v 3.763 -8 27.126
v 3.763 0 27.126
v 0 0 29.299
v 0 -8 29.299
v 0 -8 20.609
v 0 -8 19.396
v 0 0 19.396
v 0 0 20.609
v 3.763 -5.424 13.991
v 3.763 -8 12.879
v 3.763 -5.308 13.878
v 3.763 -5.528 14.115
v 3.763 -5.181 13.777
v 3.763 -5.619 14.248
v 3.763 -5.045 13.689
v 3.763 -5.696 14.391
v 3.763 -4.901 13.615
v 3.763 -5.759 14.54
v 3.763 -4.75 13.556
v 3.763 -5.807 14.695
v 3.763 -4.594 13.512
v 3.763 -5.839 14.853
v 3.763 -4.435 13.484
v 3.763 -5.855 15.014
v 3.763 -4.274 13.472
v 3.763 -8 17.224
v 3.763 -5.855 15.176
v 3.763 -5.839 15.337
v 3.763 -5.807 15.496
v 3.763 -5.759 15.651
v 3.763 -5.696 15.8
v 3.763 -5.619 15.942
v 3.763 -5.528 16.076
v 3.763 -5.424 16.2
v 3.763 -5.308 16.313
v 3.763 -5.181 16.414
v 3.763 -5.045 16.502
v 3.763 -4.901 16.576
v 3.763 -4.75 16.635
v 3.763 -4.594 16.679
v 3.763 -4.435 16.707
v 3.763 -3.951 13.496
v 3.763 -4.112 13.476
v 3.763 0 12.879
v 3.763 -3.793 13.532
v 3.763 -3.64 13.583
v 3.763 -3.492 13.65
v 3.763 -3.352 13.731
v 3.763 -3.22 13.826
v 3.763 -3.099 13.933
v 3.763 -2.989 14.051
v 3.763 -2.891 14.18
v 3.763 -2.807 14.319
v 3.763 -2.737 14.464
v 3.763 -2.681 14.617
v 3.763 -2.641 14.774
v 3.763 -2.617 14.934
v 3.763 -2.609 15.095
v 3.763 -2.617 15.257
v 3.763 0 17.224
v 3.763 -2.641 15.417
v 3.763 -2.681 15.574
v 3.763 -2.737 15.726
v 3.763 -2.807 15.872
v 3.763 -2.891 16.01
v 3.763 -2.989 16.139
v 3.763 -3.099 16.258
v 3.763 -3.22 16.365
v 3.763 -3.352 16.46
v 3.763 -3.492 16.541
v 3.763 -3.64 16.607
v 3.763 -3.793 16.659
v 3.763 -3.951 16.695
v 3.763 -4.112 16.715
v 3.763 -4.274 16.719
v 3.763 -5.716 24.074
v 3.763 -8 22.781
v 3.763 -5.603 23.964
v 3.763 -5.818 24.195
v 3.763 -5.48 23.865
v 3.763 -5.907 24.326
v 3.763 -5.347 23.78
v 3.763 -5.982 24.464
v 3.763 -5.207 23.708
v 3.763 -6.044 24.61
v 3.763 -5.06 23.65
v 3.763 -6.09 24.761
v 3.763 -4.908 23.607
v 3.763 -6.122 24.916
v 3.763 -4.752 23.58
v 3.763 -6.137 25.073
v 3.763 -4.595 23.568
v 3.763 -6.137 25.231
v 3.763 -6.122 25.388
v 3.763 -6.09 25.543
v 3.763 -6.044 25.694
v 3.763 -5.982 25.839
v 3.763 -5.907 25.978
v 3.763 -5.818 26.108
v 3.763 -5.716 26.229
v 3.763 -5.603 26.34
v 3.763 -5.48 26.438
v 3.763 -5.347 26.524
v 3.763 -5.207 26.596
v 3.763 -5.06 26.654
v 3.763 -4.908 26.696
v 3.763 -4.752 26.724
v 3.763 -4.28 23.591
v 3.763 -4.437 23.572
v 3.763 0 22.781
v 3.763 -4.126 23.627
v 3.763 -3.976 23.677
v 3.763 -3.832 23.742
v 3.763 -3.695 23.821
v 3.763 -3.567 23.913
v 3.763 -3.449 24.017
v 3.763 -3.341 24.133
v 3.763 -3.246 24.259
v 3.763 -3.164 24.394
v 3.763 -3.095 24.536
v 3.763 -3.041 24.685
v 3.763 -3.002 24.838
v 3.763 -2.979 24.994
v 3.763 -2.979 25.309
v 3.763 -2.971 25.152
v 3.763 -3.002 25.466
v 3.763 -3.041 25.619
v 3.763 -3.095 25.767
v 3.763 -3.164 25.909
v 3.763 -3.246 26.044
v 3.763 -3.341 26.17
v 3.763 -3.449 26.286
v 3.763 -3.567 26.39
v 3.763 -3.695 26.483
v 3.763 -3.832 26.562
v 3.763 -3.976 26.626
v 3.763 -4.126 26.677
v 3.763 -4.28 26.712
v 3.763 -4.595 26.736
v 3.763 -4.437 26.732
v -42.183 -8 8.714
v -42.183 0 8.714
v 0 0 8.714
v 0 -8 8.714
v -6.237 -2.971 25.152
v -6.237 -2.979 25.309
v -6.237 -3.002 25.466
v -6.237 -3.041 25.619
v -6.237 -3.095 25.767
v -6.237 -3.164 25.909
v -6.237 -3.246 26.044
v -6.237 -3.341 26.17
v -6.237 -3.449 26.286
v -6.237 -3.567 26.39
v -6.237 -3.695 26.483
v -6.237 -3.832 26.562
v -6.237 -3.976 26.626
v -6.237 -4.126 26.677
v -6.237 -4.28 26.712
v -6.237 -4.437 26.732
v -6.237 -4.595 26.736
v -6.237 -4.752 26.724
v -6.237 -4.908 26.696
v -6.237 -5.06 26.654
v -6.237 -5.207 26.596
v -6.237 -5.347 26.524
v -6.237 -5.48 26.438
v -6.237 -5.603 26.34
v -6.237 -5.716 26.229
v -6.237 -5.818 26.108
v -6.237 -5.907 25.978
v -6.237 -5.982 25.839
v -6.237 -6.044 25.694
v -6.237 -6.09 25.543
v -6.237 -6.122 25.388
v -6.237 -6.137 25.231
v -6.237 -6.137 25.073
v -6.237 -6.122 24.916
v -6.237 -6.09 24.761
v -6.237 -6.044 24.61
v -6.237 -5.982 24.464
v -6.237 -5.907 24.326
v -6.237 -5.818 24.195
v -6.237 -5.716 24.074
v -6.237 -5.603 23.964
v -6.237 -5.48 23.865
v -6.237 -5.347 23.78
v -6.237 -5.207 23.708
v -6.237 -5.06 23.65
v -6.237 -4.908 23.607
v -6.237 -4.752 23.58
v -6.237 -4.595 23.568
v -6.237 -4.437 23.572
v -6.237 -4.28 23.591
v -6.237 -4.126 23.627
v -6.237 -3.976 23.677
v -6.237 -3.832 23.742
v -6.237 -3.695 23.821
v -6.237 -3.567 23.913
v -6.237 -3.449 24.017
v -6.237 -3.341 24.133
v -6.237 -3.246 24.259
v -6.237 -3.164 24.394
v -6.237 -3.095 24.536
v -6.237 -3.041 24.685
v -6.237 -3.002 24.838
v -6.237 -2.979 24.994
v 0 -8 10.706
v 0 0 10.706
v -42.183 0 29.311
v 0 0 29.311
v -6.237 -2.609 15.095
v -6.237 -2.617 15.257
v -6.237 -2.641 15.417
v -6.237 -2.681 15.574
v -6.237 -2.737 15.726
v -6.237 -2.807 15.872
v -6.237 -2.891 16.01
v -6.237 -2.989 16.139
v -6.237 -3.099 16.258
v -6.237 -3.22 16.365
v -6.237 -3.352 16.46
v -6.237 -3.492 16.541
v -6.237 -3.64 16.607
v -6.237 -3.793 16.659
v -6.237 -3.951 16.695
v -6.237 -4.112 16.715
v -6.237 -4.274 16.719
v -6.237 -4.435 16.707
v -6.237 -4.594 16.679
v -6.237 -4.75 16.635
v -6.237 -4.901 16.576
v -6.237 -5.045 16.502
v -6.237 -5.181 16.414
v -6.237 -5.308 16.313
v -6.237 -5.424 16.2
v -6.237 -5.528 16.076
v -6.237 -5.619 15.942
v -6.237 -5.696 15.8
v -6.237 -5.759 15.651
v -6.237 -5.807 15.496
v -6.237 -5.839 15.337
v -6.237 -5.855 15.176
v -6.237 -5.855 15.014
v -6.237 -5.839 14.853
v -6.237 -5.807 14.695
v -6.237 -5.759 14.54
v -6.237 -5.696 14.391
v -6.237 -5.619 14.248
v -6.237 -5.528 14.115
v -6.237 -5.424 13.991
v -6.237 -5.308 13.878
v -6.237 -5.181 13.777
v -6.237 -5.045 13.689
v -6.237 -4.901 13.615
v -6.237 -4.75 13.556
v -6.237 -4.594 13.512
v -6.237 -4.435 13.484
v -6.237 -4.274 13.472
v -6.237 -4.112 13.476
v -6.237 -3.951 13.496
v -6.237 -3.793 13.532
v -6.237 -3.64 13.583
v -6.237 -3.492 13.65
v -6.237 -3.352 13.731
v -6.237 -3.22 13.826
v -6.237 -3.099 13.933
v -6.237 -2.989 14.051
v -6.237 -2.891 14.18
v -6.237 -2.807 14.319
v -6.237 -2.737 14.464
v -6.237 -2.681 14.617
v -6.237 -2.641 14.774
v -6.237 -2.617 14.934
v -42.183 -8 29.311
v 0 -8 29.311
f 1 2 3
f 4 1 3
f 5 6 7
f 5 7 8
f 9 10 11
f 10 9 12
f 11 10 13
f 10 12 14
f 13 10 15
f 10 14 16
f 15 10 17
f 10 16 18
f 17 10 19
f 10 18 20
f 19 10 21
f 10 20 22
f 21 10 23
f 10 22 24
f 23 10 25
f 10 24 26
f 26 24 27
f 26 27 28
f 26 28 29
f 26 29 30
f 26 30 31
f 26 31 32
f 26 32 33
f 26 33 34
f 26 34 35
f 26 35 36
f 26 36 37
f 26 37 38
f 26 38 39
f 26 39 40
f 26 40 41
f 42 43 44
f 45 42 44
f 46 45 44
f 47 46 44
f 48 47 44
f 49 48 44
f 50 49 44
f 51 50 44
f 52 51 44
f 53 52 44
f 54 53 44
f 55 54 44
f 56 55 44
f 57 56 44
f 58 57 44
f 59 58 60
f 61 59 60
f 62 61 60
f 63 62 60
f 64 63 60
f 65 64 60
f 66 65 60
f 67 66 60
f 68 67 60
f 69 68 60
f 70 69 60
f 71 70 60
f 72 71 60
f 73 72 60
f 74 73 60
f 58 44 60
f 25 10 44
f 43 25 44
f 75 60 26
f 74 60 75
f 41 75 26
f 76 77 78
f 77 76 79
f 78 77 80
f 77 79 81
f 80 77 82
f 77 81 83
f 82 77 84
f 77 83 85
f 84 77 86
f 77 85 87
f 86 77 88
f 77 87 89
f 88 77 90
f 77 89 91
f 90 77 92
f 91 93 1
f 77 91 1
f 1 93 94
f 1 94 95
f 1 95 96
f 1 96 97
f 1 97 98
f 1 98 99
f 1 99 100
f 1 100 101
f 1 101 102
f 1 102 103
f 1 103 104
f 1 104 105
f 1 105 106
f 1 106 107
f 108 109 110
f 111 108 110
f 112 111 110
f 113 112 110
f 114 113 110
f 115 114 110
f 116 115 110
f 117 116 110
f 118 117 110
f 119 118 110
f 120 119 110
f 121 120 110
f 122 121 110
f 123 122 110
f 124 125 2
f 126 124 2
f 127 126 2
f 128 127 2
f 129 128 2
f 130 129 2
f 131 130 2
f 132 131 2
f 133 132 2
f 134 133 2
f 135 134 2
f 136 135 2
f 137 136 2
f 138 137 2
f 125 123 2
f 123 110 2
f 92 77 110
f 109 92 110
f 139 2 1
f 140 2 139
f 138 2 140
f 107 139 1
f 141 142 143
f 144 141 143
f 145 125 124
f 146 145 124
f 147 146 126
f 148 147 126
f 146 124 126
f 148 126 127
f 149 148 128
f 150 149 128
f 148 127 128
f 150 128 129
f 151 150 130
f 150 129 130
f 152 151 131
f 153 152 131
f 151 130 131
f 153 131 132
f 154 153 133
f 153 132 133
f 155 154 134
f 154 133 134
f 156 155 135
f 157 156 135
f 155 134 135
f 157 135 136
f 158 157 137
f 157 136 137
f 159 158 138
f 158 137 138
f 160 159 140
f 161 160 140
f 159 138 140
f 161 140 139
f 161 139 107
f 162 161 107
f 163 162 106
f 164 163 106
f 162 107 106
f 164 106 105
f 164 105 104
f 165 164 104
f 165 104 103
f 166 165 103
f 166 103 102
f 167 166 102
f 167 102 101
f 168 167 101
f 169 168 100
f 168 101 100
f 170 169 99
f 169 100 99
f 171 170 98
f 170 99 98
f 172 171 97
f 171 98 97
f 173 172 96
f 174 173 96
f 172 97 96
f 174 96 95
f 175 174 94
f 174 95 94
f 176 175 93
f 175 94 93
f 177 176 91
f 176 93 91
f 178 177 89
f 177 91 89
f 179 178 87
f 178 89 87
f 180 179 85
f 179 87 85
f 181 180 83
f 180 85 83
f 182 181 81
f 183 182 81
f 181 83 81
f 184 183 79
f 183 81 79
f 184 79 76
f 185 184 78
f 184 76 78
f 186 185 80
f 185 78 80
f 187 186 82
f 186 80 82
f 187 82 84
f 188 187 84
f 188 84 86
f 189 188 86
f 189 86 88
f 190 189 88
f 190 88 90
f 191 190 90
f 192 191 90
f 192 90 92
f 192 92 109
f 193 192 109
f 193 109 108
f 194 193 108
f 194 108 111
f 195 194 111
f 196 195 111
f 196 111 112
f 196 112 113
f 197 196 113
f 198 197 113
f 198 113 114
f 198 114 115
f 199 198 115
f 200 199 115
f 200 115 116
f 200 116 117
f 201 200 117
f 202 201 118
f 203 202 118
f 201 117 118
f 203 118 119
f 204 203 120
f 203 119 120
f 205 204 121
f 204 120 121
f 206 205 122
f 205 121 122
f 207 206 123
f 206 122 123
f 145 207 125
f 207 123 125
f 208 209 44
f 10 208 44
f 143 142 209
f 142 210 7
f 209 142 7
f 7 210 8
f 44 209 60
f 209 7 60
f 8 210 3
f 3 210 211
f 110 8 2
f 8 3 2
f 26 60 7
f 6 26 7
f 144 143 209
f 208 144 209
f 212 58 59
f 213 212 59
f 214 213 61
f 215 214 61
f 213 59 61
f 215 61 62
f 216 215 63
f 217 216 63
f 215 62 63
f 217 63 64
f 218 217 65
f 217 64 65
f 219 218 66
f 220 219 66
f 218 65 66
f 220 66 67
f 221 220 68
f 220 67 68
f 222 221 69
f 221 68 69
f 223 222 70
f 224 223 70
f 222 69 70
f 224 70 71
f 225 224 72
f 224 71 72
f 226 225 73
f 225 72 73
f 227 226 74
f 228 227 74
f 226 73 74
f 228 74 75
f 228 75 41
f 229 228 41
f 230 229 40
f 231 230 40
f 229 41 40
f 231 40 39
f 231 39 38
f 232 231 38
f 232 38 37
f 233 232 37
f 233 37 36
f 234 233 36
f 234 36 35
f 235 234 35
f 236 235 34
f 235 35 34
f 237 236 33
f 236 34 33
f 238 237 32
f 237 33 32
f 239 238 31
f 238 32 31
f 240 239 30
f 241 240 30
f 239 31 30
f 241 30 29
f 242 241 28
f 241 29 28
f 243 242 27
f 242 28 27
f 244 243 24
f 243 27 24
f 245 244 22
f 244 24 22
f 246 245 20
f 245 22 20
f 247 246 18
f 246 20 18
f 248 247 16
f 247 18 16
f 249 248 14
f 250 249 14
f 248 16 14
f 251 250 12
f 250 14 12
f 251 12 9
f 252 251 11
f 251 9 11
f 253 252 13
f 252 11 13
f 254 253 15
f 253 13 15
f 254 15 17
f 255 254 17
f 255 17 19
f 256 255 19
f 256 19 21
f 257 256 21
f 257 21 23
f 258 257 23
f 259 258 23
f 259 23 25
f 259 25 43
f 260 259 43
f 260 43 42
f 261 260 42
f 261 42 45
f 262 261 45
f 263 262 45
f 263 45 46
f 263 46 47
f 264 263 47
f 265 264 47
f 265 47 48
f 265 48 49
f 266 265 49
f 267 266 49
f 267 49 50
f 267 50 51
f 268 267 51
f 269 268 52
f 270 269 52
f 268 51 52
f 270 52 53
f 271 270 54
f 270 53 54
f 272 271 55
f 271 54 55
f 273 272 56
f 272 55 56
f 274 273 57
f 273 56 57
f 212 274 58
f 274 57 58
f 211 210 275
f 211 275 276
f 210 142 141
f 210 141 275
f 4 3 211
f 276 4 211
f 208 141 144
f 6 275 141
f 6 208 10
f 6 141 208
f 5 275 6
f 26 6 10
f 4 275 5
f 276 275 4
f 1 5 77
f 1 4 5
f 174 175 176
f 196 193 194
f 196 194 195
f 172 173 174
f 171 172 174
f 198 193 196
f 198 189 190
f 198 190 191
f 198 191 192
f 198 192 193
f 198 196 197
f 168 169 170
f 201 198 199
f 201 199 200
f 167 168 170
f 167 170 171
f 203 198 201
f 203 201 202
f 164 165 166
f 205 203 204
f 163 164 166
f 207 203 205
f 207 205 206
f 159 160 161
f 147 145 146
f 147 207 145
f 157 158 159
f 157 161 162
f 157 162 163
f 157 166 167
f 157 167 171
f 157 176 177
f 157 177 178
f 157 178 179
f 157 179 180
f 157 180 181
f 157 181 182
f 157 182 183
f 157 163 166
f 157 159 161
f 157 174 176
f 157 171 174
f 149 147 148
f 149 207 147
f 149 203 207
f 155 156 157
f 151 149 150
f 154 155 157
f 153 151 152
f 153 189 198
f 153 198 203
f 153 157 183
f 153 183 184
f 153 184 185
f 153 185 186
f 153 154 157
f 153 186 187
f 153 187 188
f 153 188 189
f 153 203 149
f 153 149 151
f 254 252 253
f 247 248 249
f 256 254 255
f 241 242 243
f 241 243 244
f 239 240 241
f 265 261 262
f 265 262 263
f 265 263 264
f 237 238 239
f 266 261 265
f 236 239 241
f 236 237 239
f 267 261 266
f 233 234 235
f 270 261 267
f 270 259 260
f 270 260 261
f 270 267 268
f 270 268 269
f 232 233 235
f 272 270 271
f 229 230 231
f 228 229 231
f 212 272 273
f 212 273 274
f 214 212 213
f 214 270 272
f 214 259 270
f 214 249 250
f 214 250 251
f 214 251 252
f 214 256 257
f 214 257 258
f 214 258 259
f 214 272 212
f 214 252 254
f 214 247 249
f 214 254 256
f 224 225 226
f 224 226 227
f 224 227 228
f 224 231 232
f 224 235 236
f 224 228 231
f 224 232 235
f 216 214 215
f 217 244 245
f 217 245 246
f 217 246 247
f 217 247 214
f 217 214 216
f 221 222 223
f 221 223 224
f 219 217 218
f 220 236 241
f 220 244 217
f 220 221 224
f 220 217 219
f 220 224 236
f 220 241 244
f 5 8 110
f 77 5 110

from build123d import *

# Parameters (mm, degrees)
F0_W     = 42.183492
F0_H     = 20.596634
F2_DEPTH = 8
F3_DEPTH = 8
F4_R     = 1.624086
F5_DEPTH = 10
F6_R     = 1.584356
F7_DEPTH = 10


with BuildPart() as f2:
    # F0 (on Front) → F2 (new body)
    with BuildSketch(Plane.XZ):
        with Locations((-21.091746, 19.012278)):
            Rectangle(F0_W, F0_H)
    extrude(amount=F2_DEPTH)

    # F1 (on face) → F3 (join)
    with BuildSketch(Plane.XZ):
        Polygon((-3.762846, 27.126093), (-3.762846, 22.781133), (0, 20.608653), (3.762846, 22.781133), (3.762846, 27.126093), (0, 29.298573), align=None)
        Polygon((3.762846, 12.878906), (3.762846, 17.223866), (0, 19.396346), (-3.762846, 17.223866), (-3.762846, 12.878906), (0, 10.706426), align=None)
    extrude(amount=F3_DEPTH)

    # F4 (on face) → F5 (cut)
    with BuildSketch(Plane.YZ.offset(3.762846)):
        with Locations((-4.233076, 15.095317)):
            Circle(F4_R)
    extrude(amount=-F5_DEPTH, mode=Mode.SUBTRACT)

    # F6 (on face) → F7 (cut)
    with BuildSketch(Plane.YZ.offset(3.762846)):
        with Locations((-4.555025, 25.151657)):
            Circle(F6_R)
    extrude(amount=-F7_DEPTH, mode=Mode.SUBTRACT)


solid = f2.part
